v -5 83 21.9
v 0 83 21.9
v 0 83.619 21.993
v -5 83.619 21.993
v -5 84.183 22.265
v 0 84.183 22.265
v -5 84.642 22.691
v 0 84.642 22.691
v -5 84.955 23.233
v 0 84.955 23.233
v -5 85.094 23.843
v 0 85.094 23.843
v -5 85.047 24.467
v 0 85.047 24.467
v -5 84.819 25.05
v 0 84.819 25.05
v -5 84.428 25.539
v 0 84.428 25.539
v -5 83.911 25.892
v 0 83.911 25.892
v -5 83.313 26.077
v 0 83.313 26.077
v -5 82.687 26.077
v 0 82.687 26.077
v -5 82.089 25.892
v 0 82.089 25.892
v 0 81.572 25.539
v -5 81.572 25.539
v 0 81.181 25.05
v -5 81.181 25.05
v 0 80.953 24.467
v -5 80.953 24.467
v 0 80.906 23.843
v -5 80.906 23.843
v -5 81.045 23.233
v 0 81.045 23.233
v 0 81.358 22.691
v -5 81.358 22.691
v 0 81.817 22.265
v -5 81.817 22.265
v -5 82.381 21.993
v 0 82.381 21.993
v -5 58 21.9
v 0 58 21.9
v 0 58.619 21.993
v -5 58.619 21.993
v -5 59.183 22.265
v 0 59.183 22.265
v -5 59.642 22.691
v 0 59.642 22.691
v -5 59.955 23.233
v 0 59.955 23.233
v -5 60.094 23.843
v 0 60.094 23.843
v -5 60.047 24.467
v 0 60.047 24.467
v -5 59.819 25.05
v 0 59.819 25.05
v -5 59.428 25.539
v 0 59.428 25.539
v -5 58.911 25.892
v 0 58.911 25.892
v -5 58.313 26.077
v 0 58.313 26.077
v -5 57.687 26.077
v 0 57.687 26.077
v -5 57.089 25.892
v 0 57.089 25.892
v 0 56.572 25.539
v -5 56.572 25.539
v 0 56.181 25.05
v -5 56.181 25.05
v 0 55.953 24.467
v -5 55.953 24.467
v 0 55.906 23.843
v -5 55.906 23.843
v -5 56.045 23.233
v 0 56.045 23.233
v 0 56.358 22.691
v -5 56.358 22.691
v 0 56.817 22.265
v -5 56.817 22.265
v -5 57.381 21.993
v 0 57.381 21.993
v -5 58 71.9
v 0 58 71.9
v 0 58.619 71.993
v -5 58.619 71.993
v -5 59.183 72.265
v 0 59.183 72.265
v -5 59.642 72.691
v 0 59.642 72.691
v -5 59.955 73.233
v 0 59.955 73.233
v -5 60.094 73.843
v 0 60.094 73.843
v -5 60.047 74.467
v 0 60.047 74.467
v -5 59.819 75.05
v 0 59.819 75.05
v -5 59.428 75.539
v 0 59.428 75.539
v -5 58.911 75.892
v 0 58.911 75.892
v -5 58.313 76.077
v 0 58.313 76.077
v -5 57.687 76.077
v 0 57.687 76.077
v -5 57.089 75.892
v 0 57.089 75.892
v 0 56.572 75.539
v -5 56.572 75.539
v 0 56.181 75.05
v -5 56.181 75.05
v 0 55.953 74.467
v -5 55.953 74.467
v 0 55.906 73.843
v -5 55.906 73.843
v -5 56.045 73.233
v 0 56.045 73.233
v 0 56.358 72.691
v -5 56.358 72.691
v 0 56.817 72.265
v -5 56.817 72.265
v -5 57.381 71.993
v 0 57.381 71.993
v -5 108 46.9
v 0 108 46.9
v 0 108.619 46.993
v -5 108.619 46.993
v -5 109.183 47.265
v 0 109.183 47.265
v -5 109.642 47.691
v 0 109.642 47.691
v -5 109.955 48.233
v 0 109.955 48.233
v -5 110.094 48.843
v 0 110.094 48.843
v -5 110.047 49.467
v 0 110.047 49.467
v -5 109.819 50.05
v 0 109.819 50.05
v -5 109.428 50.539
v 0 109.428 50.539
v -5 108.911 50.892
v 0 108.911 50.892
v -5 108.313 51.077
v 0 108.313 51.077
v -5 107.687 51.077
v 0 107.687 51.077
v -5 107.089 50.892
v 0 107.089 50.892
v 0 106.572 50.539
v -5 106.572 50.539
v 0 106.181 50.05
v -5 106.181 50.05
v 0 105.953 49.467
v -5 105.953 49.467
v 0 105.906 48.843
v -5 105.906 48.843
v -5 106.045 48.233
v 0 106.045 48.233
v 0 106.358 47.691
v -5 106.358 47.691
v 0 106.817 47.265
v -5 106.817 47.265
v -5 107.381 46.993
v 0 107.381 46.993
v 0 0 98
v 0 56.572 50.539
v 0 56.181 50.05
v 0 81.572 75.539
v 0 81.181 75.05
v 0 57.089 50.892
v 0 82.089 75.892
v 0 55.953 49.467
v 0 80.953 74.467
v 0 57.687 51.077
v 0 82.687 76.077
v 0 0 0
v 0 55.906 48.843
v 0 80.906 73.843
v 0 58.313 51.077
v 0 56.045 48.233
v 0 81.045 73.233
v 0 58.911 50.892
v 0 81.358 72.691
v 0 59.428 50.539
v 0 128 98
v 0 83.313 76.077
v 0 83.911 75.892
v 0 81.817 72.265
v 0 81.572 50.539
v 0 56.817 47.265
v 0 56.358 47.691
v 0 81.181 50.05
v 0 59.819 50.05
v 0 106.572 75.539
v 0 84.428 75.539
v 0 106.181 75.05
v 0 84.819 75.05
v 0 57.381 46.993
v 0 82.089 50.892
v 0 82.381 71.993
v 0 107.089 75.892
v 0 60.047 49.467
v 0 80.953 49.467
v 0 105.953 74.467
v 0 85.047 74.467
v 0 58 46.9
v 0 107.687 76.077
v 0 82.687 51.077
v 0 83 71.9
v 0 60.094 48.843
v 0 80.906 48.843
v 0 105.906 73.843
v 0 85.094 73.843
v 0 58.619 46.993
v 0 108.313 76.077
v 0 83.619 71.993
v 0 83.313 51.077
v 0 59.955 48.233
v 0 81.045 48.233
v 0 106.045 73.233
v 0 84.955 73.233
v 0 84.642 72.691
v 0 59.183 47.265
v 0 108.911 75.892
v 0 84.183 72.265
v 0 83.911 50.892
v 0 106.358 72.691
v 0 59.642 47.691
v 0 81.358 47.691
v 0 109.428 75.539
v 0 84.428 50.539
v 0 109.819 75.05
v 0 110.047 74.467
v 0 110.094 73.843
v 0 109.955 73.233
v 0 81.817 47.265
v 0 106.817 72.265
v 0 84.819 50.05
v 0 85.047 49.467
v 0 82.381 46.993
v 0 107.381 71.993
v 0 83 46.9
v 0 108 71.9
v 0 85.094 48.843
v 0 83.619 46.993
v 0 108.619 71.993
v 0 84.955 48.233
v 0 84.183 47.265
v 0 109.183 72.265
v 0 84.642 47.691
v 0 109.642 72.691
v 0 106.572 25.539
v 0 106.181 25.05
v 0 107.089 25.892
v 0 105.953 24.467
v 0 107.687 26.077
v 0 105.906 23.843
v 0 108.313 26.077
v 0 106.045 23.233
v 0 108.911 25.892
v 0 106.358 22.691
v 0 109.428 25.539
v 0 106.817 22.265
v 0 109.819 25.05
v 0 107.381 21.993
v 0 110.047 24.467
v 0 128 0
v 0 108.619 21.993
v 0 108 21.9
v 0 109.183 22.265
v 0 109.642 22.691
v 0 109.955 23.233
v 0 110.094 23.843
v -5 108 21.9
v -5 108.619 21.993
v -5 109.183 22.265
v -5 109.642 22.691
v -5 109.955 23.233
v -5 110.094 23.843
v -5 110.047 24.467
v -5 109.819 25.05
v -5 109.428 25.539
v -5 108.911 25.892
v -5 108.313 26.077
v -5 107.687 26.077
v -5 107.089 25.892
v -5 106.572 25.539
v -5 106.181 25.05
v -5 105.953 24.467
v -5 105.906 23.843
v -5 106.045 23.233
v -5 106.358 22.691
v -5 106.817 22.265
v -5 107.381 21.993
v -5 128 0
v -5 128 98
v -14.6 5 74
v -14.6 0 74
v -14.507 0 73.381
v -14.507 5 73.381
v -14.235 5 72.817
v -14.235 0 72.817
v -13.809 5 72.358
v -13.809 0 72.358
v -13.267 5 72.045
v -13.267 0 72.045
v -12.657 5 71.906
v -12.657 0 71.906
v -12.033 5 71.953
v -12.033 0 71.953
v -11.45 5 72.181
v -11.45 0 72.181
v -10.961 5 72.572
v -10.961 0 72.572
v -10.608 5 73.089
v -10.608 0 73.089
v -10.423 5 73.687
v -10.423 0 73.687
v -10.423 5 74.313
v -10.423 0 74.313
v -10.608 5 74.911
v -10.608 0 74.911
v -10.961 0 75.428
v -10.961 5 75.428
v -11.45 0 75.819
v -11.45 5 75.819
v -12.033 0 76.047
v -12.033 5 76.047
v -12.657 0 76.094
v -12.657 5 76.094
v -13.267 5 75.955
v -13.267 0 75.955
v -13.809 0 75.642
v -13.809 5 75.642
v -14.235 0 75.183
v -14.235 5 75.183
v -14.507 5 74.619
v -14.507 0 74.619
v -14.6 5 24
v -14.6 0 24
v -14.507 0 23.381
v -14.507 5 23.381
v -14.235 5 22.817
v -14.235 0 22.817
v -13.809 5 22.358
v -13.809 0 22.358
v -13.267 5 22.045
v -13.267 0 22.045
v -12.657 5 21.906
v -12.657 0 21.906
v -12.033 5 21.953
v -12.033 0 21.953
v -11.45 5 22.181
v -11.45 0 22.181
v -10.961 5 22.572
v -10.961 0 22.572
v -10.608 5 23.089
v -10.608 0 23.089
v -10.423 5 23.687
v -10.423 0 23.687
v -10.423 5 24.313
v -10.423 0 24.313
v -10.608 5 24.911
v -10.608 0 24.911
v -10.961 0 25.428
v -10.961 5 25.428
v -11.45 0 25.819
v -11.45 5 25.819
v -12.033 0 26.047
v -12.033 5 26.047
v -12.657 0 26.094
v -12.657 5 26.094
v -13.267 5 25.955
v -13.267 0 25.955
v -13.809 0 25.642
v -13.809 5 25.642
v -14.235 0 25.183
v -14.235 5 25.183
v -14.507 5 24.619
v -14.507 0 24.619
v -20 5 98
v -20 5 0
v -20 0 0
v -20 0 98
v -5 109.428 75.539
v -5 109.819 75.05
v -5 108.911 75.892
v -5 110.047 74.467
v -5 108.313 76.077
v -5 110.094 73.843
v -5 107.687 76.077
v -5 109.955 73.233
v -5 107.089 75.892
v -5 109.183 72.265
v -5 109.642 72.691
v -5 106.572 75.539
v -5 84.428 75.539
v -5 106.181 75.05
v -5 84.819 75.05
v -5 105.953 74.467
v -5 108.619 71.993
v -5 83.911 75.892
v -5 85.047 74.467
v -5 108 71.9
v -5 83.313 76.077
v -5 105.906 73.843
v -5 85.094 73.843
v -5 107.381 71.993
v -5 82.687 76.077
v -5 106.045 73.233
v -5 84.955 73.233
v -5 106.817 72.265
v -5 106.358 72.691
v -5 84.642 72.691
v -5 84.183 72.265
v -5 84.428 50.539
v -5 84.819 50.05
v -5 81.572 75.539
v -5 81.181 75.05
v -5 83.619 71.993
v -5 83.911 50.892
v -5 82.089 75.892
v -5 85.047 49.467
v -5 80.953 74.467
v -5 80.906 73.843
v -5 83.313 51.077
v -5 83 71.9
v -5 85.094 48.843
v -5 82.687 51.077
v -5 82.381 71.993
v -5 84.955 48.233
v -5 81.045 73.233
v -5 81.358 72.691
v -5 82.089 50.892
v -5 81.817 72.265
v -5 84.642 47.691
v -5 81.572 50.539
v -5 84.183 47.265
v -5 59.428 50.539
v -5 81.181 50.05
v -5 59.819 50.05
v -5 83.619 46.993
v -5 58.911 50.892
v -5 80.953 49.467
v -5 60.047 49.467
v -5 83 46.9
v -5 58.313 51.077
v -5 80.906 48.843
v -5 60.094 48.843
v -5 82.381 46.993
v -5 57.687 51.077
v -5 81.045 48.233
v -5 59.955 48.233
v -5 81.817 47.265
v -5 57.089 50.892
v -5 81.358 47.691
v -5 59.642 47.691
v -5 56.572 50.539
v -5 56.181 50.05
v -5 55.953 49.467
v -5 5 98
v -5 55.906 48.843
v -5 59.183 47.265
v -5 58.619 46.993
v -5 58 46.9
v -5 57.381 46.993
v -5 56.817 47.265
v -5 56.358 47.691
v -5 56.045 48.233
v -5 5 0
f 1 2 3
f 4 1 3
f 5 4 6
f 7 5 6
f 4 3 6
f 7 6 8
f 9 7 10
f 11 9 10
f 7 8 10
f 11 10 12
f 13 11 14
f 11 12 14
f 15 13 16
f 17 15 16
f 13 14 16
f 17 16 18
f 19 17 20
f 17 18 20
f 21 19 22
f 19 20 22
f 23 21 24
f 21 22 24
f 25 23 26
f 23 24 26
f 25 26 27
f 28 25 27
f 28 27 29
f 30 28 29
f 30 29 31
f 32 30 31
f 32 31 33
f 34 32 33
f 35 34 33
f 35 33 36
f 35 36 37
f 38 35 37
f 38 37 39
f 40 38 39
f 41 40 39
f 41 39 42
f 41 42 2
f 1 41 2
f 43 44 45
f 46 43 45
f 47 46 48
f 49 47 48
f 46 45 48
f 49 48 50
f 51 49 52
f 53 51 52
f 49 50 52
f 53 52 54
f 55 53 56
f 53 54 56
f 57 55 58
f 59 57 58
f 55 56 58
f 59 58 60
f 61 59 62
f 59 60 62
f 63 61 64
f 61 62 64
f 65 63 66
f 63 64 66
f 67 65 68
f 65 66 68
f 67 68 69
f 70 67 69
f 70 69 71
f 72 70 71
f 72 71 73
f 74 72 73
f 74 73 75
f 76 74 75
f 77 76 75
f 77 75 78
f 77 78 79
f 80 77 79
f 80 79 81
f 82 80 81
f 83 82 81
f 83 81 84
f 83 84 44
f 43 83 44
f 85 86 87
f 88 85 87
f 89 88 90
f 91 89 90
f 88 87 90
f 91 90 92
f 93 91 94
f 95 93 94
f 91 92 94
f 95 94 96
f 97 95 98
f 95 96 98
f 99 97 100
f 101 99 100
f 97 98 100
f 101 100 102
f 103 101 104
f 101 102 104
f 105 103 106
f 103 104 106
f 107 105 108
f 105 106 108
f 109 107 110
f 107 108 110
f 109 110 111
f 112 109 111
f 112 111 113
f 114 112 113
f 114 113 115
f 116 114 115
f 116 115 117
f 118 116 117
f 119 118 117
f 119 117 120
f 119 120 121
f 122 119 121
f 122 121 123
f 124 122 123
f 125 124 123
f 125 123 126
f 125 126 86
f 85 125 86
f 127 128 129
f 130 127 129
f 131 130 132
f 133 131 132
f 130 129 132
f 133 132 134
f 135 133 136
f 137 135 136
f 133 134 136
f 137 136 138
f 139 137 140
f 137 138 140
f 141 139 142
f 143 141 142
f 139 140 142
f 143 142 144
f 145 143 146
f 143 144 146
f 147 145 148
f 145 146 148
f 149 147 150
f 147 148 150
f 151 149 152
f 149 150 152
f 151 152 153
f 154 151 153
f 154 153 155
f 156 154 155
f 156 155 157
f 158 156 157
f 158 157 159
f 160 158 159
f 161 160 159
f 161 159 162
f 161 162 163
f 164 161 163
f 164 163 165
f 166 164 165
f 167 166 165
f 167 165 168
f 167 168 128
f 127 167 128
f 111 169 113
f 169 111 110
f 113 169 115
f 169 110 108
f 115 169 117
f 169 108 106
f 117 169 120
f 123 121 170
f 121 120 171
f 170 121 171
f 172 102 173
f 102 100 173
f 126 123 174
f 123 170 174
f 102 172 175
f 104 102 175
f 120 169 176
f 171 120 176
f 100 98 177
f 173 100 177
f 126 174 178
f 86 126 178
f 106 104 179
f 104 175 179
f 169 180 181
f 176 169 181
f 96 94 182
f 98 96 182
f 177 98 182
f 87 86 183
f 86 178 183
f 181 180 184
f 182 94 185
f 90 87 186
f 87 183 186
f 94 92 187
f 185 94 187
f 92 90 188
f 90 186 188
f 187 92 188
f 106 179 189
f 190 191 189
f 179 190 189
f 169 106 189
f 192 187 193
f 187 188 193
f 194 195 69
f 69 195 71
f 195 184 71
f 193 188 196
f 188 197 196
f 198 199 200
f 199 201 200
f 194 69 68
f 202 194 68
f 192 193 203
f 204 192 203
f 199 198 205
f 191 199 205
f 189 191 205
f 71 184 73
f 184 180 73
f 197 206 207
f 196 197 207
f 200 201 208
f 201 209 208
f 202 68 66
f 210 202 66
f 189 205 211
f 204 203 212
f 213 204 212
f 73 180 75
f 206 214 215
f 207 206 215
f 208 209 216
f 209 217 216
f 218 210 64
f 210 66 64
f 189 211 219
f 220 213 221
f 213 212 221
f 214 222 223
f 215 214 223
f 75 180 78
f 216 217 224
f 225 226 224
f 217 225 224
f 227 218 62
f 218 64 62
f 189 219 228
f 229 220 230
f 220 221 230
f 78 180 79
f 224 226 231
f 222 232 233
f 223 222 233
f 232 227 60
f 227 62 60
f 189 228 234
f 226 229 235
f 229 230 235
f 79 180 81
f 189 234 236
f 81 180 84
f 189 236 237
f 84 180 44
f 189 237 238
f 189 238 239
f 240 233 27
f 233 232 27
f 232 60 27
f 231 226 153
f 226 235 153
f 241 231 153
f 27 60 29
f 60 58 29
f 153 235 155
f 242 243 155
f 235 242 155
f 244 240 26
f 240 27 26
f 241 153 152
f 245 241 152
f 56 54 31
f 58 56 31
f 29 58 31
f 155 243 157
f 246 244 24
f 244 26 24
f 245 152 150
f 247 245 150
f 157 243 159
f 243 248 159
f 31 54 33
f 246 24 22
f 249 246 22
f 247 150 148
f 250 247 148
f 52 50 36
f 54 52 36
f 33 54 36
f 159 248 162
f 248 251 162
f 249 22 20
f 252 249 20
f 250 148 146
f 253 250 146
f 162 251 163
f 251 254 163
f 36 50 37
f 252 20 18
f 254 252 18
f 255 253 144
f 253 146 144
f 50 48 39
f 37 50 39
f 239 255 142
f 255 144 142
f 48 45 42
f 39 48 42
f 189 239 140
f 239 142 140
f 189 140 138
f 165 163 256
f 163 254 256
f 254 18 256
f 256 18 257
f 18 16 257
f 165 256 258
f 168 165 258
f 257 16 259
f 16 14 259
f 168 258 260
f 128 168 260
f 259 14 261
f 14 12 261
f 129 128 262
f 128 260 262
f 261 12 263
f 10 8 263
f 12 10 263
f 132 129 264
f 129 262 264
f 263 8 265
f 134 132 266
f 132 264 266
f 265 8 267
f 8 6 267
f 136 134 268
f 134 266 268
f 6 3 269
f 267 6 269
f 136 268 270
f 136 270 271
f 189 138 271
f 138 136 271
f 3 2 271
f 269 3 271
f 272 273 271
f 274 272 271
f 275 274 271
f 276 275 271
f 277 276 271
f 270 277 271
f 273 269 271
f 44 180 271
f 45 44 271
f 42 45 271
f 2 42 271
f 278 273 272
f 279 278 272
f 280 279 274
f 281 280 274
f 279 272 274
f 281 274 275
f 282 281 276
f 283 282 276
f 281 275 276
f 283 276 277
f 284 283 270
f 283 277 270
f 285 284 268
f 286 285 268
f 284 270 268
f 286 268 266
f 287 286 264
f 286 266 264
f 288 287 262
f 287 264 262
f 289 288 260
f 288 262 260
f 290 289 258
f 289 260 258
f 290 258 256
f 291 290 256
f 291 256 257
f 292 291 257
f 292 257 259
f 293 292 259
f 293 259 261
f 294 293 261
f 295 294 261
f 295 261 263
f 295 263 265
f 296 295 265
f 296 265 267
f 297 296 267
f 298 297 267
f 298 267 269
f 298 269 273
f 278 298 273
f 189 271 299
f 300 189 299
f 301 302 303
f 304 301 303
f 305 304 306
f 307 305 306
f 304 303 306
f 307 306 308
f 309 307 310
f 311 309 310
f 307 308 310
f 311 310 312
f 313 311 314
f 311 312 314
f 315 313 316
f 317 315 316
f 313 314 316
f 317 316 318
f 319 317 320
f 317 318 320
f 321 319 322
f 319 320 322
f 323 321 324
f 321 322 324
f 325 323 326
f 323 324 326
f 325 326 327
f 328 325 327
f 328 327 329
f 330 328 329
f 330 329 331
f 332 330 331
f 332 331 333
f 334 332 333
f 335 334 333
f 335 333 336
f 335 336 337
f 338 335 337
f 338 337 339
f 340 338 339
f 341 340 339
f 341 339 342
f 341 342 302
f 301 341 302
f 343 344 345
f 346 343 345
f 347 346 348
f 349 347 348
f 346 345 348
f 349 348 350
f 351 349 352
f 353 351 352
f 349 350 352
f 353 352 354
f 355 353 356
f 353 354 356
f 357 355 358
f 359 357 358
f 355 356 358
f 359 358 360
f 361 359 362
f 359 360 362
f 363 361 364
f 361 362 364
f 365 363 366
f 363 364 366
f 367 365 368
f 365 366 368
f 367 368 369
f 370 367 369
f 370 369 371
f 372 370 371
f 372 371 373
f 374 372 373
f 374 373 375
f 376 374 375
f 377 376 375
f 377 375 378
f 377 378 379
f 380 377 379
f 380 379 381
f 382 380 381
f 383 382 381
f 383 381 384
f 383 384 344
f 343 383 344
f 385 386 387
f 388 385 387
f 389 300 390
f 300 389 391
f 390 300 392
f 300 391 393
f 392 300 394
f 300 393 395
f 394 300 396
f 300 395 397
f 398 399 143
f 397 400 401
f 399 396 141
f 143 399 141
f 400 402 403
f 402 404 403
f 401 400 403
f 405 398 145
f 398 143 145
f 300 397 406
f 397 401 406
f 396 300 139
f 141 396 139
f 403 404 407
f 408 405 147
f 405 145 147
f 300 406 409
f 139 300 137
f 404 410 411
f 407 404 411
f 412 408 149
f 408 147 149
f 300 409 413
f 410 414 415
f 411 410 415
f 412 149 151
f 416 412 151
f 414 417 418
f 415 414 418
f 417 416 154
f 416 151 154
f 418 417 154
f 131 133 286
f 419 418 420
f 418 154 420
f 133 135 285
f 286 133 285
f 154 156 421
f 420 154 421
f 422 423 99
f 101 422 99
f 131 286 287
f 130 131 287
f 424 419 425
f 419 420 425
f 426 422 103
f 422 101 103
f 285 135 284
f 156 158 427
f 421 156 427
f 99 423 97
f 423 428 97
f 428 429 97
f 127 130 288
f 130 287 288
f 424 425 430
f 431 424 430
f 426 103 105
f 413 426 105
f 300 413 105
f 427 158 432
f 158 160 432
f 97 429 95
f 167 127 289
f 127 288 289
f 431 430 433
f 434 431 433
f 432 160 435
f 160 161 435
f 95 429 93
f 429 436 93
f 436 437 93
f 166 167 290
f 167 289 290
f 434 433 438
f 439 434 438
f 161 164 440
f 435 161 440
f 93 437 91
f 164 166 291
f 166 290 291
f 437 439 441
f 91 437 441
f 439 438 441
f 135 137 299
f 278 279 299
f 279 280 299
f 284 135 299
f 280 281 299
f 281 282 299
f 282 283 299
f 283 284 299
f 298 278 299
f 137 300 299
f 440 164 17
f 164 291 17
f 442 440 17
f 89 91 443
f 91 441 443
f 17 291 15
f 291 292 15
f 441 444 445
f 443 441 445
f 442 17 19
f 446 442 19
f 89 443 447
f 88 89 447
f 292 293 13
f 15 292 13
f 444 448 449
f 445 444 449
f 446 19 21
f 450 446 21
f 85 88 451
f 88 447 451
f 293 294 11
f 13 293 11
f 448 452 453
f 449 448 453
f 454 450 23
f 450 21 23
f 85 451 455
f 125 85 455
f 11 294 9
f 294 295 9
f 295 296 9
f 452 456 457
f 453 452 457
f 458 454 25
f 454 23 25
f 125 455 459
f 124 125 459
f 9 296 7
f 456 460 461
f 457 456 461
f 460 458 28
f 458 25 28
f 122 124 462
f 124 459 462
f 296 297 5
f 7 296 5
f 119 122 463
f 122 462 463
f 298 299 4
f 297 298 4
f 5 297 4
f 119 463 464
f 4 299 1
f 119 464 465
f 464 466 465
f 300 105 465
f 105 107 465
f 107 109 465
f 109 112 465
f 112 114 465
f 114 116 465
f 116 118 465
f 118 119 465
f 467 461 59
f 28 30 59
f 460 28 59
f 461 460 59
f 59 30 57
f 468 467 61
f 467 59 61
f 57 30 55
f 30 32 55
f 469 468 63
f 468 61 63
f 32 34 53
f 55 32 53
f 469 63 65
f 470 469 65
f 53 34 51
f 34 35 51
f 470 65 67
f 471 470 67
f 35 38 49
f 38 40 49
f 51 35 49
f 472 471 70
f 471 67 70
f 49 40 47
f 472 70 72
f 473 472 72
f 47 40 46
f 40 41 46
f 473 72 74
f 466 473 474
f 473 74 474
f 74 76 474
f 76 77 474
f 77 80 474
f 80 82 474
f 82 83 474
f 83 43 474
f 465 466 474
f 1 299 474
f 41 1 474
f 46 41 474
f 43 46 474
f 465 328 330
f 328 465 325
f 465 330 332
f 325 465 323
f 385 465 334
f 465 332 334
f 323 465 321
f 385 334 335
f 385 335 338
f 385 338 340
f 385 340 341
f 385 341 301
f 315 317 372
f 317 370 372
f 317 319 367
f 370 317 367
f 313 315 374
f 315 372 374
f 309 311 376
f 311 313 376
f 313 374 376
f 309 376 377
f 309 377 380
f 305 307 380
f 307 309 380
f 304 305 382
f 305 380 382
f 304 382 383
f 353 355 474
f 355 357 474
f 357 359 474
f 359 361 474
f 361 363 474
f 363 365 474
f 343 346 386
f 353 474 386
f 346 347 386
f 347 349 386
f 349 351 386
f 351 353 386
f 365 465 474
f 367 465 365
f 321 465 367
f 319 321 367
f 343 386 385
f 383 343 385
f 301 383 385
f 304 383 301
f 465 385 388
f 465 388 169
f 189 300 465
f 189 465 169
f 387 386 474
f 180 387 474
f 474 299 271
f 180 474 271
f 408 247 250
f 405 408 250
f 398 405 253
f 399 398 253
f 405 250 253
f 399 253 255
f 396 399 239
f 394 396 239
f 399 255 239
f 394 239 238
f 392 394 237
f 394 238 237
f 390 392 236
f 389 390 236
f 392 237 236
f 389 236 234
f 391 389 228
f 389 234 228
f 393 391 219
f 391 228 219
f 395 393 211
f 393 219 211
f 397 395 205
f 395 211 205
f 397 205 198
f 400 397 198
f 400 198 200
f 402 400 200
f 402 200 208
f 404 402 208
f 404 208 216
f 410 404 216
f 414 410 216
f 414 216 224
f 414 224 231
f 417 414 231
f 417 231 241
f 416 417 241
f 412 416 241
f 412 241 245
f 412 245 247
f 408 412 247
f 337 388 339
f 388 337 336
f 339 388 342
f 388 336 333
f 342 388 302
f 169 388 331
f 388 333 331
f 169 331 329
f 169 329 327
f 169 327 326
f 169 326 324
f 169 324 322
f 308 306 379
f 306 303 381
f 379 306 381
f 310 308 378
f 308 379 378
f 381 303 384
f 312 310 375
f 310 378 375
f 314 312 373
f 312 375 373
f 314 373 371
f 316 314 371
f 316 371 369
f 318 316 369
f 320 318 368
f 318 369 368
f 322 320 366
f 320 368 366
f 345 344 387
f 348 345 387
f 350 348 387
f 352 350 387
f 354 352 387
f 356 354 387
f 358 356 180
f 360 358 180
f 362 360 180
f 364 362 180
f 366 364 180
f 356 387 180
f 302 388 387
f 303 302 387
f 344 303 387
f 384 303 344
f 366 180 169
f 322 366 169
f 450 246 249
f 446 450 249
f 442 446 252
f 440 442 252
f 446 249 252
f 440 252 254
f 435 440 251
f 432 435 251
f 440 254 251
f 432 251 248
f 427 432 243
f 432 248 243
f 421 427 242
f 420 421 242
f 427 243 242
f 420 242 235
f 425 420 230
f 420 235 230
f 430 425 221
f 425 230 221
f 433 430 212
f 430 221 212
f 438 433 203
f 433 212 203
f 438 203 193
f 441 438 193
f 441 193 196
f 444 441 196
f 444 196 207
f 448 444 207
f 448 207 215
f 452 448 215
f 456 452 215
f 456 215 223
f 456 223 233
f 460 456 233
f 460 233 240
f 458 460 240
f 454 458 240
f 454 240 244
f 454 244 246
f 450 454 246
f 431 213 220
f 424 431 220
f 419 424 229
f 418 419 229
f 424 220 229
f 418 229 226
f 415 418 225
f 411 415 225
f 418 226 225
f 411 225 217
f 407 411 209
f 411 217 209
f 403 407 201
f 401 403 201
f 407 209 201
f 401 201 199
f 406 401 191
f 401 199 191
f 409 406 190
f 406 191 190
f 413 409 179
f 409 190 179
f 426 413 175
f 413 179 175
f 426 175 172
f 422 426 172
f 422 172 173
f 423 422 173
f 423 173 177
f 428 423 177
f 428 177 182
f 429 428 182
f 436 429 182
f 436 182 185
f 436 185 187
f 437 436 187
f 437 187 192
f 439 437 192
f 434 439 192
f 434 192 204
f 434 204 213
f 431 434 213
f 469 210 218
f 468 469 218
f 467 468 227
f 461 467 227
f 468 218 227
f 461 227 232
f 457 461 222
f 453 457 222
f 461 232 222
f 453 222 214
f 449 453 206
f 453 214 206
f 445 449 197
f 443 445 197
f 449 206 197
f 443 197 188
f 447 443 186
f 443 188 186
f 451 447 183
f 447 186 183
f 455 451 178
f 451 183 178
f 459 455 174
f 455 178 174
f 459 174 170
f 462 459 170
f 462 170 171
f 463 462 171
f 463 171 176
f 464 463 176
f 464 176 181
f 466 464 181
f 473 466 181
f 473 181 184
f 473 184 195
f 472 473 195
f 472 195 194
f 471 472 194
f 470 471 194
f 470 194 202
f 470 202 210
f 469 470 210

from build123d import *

# Parameters (mm, degrees)
EXTRUDE_1_DEPTH        = 98
HOLE_WIZARD_M5_1_D     = 4.2
HOLE_WIZARD_M5_1_DEPTH = 14
HOLE_WIZARD_M5_1_TIP   = 1.2618073
HOLE_WIZARD_M5_2_D     = 4.2
HOLE_WIZARD_M5_2_DEPTH = 14
HOLE_WIZARD_M5_2_TIP   = 1.2618073


with BuildPart() as part:
    # 草图1 → 凸台-拉伸1 (new body)
    with BuildSketch(Plane.XY):
        Polygon((0, 0), (0, 128), (-5, 128), (-5, 5), (-20, 5), (-20, 0), align=None)
    extrude(amount=EXTRUDE_1_DEPTH)

    # M5 螺纹孔1
    with Locations(Plane(origin=(0, 5, 0), x_dir=(1, 0, 0), z_dir=(0, 1, 0))):
        with Locations((-12.5, -24), (-12.5, -74)):
            Hole(HOLE_WIZARD_M5_1_D / 2, depth=HOLE_WIZARD_M5_1_DEPTH)
            with Locations((0, 0, -(HOLE_WIZARD_M5_1_DEPTH + HOLE_WIZARD_M5_1_TIP / 2))):  # 118° drill point
                Cone(0, HOLE_WIZARD_M5_1_D / 2, HOLE_WIZARD_M5_1_TIP, mode=Mode.SUBTRACT)

    # M5 螺纹孔2
    with Locations(Plane.ZY.offset(5)):
        with Locations((24, 58), (49, 58), (74, 58), (74, 83), (74, 108), (49, 108), (24, 108), (24, 83), (49, 83)):
            Hole(HOLE_WIZARD_M5_2_D / 2, depth=HOLE_WIZARD_M5_2_DEPTH)
            with Locations((0, 0, -(HOLE_WIZARD_M5_2_DEPTH + HOLE_WIZARD_M5_2_TIP / 2))):  # 118° drill point
                Cone(0, HOLE_WIZARD_M5_2_D / 2, HOLE_WIZARD_M5_2_TIP, mode=Mode.SUBTRACT)


solid = part.part
